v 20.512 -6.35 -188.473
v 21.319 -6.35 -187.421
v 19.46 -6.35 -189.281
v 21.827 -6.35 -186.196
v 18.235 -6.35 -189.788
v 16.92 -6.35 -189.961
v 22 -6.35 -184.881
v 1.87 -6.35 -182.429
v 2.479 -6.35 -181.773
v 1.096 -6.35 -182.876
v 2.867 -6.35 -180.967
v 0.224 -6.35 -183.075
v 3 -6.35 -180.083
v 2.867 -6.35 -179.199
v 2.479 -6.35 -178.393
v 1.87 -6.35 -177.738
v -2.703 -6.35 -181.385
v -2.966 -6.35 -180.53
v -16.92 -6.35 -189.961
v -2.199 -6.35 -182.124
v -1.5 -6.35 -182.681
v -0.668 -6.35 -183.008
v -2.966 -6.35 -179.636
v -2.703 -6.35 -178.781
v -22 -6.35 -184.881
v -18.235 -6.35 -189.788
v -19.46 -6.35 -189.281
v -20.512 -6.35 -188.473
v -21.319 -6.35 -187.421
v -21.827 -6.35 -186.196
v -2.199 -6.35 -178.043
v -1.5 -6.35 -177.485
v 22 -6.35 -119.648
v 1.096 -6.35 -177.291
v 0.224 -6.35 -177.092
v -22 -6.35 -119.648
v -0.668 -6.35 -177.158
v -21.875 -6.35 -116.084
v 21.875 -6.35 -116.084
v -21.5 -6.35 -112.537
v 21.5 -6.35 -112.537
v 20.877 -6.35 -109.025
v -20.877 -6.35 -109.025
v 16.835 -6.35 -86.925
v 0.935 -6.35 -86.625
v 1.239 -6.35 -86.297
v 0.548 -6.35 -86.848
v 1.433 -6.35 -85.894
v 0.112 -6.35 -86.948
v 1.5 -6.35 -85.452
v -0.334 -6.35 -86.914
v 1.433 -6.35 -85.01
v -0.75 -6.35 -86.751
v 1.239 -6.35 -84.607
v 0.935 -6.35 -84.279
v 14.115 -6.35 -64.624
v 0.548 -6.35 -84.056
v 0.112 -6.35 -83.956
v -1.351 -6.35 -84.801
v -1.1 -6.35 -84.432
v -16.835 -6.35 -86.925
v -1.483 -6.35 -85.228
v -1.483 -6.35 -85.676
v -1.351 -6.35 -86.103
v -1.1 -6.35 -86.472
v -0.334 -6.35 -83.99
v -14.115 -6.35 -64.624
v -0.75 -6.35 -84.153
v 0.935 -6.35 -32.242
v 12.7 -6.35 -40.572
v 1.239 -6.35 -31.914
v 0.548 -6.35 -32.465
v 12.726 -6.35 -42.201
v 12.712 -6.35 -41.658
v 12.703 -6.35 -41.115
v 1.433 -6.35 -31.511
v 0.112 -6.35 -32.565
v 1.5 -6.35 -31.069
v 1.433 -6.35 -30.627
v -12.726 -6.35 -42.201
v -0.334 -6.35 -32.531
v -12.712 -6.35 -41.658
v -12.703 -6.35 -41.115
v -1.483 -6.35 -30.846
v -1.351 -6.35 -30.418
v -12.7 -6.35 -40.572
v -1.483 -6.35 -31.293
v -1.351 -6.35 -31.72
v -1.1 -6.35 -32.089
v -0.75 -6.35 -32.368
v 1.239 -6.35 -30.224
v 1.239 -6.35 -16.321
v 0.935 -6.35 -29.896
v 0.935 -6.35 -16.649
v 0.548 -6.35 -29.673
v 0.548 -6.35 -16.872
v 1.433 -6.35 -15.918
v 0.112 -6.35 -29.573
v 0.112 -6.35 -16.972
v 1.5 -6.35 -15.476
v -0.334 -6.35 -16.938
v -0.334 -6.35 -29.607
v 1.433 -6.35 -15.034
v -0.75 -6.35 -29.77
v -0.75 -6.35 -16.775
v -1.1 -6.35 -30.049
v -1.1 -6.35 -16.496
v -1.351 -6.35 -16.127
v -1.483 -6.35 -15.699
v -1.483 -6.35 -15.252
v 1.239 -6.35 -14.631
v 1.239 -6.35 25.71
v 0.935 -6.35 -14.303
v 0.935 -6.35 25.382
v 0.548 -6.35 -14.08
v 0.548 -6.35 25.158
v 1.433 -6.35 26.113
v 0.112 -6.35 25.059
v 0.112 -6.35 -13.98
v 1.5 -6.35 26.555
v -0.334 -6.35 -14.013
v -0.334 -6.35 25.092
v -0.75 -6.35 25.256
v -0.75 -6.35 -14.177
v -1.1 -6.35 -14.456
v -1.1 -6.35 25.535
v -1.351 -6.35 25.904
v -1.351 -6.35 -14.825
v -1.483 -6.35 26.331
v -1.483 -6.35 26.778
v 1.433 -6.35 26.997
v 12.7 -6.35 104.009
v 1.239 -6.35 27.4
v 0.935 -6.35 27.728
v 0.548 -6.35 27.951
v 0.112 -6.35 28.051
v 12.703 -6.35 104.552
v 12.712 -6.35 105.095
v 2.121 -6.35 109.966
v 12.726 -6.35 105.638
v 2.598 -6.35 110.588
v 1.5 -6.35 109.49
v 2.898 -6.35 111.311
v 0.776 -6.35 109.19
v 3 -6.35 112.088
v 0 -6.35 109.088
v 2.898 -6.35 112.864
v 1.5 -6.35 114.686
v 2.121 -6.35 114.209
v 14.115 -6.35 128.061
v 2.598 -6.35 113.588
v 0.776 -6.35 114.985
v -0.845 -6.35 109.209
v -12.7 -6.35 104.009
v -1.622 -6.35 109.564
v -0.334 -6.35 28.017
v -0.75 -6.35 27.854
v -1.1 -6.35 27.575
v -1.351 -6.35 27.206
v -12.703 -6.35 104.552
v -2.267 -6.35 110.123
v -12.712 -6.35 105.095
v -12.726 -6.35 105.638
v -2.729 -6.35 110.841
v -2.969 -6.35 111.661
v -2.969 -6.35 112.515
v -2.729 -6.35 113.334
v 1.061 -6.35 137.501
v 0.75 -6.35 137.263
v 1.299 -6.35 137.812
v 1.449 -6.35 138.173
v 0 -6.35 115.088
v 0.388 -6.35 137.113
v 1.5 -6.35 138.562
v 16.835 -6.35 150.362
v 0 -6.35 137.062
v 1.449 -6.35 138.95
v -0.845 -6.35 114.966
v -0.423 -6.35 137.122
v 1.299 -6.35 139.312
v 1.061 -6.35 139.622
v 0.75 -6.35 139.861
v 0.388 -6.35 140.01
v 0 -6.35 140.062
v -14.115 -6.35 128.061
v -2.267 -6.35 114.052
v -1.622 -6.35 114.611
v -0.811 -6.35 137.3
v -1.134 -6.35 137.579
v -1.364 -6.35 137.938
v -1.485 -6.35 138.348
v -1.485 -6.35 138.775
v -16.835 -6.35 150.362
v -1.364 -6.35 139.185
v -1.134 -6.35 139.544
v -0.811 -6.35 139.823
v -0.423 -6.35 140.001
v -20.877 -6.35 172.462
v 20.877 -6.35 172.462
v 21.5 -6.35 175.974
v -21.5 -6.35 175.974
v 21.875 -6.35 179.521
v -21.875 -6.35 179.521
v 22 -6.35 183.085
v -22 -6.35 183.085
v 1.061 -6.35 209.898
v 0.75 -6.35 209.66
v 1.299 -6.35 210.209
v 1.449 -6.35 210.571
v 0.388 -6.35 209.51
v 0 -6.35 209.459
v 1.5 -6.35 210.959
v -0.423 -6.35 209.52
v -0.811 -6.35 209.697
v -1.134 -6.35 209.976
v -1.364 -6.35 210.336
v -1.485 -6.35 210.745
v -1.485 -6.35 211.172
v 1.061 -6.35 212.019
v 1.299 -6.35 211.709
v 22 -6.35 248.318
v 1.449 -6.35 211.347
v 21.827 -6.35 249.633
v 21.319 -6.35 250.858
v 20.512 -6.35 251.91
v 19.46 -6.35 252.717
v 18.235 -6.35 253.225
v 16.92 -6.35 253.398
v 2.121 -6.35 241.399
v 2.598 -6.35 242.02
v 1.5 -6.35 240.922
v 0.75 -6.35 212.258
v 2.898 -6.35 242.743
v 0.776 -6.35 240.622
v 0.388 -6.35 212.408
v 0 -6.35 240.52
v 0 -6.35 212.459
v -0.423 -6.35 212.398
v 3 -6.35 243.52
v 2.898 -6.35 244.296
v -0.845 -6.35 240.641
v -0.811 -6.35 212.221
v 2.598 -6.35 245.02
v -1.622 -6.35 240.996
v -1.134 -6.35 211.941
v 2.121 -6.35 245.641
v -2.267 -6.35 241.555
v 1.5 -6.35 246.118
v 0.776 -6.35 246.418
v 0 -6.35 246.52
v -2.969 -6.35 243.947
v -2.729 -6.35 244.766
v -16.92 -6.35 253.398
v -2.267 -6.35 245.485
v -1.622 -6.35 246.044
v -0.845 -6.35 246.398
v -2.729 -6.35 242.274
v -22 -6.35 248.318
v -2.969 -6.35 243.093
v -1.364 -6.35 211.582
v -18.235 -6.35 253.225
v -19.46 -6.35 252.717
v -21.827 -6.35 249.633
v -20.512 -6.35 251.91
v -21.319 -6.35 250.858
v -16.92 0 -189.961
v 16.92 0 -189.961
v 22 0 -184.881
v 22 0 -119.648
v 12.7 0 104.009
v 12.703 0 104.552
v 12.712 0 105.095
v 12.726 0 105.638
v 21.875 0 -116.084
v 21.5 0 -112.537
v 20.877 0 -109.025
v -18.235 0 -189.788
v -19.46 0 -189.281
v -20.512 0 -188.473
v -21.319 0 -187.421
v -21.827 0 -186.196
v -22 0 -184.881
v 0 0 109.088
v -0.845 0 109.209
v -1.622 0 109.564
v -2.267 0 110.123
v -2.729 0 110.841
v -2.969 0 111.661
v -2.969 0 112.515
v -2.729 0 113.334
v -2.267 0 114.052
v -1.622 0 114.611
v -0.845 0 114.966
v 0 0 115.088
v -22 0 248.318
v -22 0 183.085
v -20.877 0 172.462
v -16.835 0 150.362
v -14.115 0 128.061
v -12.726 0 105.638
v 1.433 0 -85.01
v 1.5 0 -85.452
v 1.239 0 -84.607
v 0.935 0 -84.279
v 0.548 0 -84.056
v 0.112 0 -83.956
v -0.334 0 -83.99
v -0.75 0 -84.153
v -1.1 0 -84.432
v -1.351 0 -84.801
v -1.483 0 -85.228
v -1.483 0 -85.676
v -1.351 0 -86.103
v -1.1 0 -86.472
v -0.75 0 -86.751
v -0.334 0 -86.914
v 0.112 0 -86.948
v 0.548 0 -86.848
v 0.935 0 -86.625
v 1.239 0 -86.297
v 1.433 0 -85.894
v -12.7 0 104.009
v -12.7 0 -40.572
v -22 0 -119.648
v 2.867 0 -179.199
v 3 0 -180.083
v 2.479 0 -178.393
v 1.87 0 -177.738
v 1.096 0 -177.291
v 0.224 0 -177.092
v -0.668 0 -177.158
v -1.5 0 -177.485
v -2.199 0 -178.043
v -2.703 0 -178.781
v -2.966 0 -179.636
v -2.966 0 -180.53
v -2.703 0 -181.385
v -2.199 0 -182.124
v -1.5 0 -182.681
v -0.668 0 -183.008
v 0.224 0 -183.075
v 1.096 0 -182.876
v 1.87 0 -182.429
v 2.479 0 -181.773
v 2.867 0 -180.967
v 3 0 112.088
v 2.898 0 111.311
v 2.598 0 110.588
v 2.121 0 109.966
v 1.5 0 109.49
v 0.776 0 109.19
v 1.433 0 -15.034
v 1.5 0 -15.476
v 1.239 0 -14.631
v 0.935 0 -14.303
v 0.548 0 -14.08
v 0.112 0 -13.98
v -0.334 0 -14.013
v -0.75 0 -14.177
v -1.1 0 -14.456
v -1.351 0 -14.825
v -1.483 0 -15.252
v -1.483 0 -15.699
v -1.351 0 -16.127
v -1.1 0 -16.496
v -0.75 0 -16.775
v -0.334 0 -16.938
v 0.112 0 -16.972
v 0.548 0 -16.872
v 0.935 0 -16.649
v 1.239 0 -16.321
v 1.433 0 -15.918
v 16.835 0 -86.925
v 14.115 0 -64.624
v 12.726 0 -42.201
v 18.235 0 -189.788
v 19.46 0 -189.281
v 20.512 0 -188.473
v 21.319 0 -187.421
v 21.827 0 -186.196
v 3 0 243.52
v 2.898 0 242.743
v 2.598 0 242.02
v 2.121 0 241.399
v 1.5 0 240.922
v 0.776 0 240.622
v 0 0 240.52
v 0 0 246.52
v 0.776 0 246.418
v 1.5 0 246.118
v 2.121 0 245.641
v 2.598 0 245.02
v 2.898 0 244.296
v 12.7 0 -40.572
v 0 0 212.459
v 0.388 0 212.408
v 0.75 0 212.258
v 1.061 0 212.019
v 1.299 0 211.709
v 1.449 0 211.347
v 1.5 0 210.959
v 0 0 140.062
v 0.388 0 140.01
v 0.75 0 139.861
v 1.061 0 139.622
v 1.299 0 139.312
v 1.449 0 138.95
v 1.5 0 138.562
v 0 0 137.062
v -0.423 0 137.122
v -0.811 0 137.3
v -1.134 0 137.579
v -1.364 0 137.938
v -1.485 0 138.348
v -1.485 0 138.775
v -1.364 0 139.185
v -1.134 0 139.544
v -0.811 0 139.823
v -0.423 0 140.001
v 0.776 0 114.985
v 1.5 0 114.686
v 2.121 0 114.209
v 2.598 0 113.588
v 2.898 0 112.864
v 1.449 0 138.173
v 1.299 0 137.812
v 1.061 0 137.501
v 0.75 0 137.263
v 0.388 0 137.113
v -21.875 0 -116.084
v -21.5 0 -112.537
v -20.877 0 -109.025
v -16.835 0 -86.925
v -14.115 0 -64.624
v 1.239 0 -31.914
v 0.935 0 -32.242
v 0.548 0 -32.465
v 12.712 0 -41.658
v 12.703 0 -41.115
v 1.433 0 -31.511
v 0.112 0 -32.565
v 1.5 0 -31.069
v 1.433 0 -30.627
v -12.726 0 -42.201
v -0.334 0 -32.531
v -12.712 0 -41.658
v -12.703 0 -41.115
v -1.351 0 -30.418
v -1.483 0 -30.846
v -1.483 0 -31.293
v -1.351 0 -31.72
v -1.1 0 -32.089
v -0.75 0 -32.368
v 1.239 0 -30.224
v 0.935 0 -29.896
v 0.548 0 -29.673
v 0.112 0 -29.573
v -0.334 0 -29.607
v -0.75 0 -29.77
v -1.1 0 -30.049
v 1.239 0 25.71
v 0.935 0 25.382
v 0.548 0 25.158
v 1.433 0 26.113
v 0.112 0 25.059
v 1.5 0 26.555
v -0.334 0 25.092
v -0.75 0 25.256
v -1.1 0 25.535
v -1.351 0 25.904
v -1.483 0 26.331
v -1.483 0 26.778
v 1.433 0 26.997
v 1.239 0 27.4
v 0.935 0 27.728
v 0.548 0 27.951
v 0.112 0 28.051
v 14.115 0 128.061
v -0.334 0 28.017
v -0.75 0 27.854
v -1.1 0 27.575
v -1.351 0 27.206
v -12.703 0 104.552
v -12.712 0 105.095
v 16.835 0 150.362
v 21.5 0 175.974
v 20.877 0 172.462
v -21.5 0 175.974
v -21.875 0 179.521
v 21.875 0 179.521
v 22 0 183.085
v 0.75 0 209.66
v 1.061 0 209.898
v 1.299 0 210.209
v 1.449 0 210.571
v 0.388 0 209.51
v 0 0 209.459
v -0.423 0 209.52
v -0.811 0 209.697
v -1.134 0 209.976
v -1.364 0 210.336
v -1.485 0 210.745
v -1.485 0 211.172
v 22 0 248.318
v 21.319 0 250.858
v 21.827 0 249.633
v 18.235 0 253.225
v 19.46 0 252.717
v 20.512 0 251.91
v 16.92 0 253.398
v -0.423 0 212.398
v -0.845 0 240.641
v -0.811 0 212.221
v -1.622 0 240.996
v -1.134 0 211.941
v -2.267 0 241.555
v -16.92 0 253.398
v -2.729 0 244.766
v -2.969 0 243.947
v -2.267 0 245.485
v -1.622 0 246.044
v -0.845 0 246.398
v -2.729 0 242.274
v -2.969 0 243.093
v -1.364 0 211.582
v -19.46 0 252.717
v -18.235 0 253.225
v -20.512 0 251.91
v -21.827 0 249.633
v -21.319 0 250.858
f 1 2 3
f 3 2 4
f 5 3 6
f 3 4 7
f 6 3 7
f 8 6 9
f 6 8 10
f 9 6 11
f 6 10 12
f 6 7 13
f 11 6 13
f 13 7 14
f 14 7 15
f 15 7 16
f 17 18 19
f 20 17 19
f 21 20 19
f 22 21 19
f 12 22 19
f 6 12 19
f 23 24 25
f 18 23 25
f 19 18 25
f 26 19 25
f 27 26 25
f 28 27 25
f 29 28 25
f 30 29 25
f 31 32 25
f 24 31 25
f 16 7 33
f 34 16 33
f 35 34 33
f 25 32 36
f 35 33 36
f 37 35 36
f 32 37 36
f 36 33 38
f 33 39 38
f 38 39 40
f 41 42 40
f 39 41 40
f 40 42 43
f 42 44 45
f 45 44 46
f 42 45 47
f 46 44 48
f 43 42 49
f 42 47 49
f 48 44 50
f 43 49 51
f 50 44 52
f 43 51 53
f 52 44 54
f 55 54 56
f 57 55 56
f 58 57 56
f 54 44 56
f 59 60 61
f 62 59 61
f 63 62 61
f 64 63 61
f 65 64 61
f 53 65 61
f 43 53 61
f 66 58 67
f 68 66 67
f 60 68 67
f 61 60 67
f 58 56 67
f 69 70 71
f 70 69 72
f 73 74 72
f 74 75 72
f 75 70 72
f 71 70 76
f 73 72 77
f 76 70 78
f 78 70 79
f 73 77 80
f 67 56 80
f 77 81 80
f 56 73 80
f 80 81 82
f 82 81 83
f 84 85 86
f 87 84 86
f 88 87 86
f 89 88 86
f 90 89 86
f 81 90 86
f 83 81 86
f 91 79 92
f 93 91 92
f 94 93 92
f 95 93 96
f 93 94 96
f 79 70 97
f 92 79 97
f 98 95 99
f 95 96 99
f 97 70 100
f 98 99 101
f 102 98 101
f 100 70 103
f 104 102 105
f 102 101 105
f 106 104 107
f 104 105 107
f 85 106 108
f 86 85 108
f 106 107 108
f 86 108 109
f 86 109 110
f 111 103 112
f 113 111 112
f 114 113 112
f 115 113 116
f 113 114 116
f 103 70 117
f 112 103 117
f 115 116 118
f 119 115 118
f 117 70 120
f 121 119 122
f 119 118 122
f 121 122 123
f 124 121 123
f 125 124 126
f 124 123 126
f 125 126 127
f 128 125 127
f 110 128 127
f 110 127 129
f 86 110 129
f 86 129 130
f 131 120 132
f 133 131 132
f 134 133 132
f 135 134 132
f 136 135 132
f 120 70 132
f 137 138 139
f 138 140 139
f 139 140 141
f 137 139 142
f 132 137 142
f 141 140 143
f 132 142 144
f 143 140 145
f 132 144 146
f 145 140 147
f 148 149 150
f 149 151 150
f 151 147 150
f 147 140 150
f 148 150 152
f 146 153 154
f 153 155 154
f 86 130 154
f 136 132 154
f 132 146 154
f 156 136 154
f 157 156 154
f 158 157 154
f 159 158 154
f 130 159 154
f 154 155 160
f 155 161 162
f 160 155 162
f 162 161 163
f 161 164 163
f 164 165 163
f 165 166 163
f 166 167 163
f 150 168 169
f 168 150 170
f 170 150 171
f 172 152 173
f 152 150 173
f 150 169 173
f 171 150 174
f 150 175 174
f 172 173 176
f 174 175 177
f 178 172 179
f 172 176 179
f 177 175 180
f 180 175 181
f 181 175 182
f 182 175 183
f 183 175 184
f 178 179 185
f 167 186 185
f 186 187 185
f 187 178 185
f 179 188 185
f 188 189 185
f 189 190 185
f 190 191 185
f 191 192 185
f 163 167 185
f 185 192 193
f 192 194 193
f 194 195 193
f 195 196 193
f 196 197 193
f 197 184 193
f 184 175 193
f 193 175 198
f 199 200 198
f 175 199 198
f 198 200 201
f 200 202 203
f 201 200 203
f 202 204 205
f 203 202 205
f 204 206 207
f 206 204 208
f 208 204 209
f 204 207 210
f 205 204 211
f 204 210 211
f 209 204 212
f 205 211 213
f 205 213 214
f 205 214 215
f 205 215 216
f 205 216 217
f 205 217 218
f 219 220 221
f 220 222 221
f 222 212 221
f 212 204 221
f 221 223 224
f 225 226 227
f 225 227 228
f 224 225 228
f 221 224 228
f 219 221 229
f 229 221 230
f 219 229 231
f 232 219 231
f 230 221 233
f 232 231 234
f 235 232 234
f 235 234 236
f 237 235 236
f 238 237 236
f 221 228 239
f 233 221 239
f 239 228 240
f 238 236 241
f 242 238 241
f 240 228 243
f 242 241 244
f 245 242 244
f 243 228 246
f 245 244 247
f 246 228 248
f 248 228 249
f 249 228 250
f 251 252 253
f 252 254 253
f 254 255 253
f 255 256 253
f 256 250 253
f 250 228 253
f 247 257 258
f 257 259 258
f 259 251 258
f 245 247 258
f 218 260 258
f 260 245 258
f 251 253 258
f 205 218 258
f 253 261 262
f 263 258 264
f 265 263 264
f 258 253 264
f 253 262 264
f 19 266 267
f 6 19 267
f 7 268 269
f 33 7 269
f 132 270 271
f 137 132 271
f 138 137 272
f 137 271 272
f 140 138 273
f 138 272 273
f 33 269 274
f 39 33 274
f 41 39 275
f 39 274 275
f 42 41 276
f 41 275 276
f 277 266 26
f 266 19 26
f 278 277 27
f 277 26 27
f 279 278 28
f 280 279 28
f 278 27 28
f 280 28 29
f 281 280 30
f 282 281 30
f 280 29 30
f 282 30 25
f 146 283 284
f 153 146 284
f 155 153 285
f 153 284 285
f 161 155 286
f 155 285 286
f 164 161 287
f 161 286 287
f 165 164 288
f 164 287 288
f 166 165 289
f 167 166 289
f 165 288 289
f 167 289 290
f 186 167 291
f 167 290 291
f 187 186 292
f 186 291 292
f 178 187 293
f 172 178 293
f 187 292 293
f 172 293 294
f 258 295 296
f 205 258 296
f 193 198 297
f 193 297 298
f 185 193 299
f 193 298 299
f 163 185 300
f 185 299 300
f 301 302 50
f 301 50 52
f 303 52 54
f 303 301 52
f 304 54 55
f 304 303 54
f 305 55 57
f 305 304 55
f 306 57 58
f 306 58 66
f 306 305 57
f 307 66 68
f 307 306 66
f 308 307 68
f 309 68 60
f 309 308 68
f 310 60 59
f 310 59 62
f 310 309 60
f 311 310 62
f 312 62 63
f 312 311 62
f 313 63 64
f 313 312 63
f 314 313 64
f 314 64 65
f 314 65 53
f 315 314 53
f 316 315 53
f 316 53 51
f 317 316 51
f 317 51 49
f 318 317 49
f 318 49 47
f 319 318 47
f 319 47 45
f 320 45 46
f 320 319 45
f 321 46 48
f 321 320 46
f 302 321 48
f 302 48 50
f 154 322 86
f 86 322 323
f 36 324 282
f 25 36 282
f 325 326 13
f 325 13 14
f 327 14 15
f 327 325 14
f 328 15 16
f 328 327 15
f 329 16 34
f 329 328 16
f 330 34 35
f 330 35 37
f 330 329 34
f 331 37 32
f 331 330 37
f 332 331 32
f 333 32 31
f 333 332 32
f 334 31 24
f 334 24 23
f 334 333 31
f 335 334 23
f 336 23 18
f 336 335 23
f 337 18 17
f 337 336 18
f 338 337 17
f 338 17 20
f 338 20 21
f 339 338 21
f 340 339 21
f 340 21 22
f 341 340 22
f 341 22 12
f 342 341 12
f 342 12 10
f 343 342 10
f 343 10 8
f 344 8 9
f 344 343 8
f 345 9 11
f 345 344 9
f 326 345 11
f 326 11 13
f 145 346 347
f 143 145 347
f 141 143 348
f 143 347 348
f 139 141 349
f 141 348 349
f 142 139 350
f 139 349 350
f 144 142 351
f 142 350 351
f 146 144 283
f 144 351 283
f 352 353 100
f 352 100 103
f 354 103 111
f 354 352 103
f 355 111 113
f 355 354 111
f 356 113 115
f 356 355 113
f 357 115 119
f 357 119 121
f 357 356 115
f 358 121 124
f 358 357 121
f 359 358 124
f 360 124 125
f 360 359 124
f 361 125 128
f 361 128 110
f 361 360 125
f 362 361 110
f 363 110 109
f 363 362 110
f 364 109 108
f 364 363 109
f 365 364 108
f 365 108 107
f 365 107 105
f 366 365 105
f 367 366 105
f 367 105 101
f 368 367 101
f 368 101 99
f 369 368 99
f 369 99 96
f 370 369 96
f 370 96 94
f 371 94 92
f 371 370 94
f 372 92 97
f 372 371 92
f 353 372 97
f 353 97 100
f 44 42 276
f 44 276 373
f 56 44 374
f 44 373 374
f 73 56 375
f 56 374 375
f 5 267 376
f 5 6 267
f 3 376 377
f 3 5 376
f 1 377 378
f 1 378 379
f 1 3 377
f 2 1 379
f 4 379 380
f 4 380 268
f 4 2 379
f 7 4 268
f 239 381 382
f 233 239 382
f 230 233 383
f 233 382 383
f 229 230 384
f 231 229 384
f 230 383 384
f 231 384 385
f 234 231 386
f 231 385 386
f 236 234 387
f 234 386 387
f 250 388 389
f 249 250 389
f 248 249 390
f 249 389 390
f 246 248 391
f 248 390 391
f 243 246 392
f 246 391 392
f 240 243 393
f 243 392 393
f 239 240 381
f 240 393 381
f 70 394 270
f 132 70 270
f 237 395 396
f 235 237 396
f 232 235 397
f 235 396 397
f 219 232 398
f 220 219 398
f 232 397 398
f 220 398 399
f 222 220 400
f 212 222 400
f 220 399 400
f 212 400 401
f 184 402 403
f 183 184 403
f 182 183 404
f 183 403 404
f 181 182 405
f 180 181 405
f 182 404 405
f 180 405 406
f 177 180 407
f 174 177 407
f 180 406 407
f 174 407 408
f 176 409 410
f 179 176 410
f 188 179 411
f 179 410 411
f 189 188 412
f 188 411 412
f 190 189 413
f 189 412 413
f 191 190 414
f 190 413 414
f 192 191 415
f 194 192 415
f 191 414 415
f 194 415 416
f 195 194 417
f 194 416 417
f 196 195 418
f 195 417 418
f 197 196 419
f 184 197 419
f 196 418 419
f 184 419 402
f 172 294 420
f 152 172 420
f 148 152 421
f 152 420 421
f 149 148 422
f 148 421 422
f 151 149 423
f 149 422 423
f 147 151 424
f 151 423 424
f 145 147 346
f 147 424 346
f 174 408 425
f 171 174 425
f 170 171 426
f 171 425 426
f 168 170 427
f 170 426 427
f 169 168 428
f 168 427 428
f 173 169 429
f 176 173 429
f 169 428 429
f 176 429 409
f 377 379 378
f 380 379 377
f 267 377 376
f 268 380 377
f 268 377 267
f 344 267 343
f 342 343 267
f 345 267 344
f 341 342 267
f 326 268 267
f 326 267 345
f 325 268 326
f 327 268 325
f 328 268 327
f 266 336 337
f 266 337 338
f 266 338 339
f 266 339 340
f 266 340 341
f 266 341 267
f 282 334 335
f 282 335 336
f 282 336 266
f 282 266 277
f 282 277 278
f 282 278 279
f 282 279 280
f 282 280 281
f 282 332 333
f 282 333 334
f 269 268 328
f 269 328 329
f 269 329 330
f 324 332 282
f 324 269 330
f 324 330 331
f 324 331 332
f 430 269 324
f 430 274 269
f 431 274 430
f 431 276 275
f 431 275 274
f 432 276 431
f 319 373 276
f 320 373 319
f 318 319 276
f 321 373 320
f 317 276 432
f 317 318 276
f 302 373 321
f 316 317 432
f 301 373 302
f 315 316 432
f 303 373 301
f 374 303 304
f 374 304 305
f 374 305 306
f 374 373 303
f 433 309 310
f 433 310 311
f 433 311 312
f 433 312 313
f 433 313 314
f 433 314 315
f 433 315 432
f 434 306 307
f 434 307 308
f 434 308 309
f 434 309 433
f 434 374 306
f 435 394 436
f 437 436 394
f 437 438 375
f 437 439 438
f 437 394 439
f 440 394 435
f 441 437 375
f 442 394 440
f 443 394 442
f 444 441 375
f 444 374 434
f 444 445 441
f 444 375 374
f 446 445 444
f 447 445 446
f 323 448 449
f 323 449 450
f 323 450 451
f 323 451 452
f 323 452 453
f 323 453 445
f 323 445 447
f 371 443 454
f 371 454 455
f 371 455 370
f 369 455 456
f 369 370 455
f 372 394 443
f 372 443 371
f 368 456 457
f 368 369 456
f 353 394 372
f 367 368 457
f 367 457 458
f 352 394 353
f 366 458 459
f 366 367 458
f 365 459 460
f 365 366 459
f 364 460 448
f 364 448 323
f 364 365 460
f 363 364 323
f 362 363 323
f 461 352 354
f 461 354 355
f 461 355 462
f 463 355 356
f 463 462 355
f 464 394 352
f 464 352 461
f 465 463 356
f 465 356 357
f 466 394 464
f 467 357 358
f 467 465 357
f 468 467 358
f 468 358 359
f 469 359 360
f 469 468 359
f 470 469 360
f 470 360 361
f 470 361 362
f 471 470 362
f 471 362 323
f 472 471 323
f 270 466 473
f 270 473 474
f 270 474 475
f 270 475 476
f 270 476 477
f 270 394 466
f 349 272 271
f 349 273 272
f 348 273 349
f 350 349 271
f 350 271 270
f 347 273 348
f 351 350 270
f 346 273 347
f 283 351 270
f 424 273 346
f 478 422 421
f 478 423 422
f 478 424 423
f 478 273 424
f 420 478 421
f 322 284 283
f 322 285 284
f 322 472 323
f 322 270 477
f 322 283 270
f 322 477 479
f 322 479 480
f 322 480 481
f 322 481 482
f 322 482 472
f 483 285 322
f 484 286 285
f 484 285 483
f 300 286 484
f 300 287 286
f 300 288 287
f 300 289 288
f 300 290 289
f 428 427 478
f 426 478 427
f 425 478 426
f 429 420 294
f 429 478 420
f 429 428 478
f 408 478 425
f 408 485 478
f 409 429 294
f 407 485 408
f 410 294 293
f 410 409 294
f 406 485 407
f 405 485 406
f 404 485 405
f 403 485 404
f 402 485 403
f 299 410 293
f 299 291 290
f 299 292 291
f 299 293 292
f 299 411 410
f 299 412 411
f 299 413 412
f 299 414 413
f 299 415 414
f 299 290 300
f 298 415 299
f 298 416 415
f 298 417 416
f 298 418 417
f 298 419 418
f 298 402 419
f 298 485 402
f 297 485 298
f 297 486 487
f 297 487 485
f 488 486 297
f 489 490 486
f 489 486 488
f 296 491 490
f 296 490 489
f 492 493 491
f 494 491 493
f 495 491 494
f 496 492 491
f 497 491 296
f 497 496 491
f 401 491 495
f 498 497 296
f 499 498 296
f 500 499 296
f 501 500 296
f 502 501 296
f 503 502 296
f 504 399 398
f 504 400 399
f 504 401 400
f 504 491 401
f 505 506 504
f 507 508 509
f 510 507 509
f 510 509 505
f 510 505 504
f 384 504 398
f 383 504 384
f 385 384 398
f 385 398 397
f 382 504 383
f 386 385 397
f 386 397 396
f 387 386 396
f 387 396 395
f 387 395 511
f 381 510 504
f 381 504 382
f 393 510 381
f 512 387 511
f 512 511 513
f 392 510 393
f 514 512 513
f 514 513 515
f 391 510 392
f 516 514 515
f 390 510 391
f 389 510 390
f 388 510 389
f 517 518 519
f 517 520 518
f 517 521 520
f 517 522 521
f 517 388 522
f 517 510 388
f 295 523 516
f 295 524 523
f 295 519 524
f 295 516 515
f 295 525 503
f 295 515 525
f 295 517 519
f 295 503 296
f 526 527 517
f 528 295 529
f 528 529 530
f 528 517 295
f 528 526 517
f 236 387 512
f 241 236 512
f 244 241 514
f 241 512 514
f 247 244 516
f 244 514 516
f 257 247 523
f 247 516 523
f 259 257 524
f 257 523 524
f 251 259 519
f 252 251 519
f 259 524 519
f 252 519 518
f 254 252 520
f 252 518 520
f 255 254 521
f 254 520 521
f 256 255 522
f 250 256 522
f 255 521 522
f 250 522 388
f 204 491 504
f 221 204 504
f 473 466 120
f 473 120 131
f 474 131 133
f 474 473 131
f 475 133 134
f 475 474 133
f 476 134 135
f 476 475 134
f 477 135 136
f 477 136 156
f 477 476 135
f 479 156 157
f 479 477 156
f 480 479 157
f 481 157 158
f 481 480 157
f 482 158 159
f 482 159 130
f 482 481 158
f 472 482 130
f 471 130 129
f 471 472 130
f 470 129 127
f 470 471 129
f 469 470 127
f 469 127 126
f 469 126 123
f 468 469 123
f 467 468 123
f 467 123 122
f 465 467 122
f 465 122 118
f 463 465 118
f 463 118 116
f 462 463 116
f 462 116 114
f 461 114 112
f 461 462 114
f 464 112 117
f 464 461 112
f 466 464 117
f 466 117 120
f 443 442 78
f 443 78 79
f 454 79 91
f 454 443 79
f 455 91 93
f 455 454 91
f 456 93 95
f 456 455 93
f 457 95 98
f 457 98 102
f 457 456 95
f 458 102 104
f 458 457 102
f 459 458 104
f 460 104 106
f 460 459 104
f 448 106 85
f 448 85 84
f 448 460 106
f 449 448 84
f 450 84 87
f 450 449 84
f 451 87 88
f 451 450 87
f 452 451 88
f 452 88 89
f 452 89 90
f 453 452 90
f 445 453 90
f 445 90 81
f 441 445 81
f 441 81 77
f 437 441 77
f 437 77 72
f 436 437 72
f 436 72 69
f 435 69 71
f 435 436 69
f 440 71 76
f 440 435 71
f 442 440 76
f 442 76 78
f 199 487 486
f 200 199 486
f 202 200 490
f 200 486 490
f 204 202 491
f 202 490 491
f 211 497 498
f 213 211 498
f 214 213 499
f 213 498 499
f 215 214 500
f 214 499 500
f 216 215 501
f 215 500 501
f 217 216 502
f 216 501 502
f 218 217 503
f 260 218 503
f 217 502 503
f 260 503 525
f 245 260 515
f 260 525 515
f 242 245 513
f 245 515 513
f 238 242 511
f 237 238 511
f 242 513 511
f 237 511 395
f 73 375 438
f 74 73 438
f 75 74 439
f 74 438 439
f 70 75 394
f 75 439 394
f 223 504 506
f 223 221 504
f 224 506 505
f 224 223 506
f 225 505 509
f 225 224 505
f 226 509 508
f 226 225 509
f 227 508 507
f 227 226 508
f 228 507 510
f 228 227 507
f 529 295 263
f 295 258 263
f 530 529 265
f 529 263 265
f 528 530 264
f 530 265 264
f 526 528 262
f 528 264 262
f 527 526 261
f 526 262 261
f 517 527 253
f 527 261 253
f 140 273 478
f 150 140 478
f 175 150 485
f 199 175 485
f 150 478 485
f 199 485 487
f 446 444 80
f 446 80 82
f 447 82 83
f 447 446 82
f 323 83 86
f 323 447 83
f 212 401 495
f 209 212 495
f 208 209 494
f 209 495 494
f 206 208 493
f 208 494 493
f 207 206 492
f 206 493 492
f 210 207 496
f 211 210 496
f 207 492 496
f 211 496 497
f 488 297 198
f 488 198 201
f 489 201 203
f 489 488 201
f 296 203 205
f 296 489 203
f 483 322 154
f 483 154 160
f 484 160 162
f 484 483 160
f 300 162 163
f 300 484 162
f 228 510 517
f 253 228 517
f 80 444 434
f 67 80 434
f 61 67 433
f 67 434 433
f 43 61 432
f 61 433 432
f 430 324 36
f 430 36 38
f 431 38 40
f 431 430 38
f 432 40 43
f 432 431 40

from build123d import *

# Parameters (mm, degrees)
F0_R        = 3
F0_R_2      = 1.5
F1_DEPTH    = 6.35
F2_R        = 5.08
F3_T1_DEPTH = 6.35
F3_T3_DEPTH = 34.0624500619


# Not quite as in the source:
# - a fillet or chamfer that OpenCascade refuses, or shapes differently, is made with other operations: its cross-section is extruded or revolved along the edge and cut away or added
# - a feature names something its author has since deleted; it is built from what else it names


with BuildPart() as f1:
    # F0 (on Front) → F1 (new body)
    with BuildSketch(Plane.XZ):
        with BuildLine():
            Line((-22, -189.9611499309), (-4.6853246795, -189.9611499309))
            Line((-4.6853246795, -189.9611499309), (4.6853246795, -189.9611499309))
            Line((4.6853246795, -189.9611499309), (22, -189.9611499309))
            Line((22, -189.9611499309), (22, -172.8709284505))
            Line((22, -172.8709284505), (22, -114.1058849427))
            ThreePointArc((22, -114.1058849427), (15.5787747464, -77.9579307824), (12.7, -41.3571195934))
            Line((12.7, -41.3571195934), (12.7, 104.7939062119))
            ThreePointArc((12.7, 104.7939062119), (15.5787747464, 141.3947174009), (22, 177.5426715612))
            Line((22, 177.5426715612), (22, 225.4278063774))
            Line((22, 225.4278063774), (22, 236.307715069))
            Line((22, 236.307715069), (22, 253.3979365494))
            Line((22, 253.3979365494), (4.6853246795, 253.3979365494))
            Line((4.6853246795, 253.3979365494), (0, 253.3979365494))
            Line((0, 253.3979365494), (-4.6853246795, 253.3979365494))
            Line((-4.6853246795, 253.3979365494), (-22, 253.3979365494))
            Line((-22, 253.3979365494), (-22, 236.307715069))
            Line((-22, 236.307715069), (-22, 225.4278063774))
            Line((-22, 225.4278063774), (-22, 177.5426715612))
            ThreePointArc((-22, 177.5426715612), (-15.5787747464, 141.3947174009), (-12.7, 104.7939062119))
            Line((-12.7, 104.7939062119), (-12.7, -41.3571195934))
            ThreePointArc((-12.7, -41.3571195934), (-15.5787747464, -77.9579307824), (-22, -114.1058849427))
            Line((-22, -114.1058849427), (-22, -161.9910197589))
            Line((-22, -161.9910197589), (-22, -189.9611499309))
        make_face()
        with Locations((0, -180.0831407309)):
            Circle(F0_R, mode=Mode.SUBTRACT)
        with Locations((0, -85.4520261312)):
            Circle(F0_R_2, mode=Mode.SUBTRACT)
        with Locations((0, -31.0690756887)):
            Circle(F0_R_2, mode=Mode.SUBTRACT)
        with Locations((0, -15.4758756887)):
            Circle(F0_R_2, mode=Mode.SUBTRACT)
        with Locations((0, 26.5547856688)):
            Circle(F0_R_2, mode=Mode.SUBTRACT)
        with BuildLine():
            ThreePointArc((0, 109.0876222849), (-3, 112.0876222849), (0, 115.0876222849))
            ThreePointArc((0, 115.0876222849), (2.1213203436, 114.2089426284), (3, 112.0876222849))
            ThreePointArc((3, 112.0876222849), (2.1213203436, 109.9663019413), (0, 109.0876222849))
        make_face(mode=Mode.SUBTRACT)
        with BuildLine():
            ThreePointArc((0, 137.0615974688), (-1.5, 138.5615974688), (0, 140.0615974688))
            ThreePointArc((0, 140.0615974688), (1.0606601718, 139.6222576406), (1.5, 138.5615974688))
            ThreePointArc((1.5, 138.5615974688), (1.0606601718, 137.5009372971), (0, 137.0615974688))
        make_face(mode=Mode.SUBTRACT)
        with BuildLine():
            ThreePointArc((0, 209.4587856688), (-1.5, 210.9587856688), (0, 212.4587856688))
            ThreePointArc((0, 212.4587856688), (1.0606601718, 212.0194458406), (1.5, 210.9587856688))
            ThreePointArc((1.5, 210.9587856688), (1.0606601718, 209.8981254971), (0, 209.4587856688))
        make_face(mode=Mode.SUBTRACT)
        with BuildLine():
            ThreePointArc((0, 240.5199192026), (-3, 243.5199192026), (0, 246.5199192026))
            ThreePointArc((0, 246.5199192026), (2.1213203436, 245.6412395461), (3, 243.5199192026))
            ThreePointArc((3, 243.5199192026), (2.1213203436, 241.398598859), (0, 240.5199192026))
        make_face(mode=Mode.SUBTRACT)
    extrude(amount=F1_DEPTH)

    # F2
    f2_edges = [f1.edges().sort_by_distance(p)[0] for p in [
        (-22, -3.175, 253.397937),
        (22, -3.175, 253.397937),
        (22, -3.175, -189.96115),
        (-22, -3.175, -189.96115),
    ]]
    fillet(f2_edges, radius=F2_R)

    # F3: fillet of radius 50.8 on 8 edges, made by hand

    # F3_s2 → F3_t1 (join)
    with BuildSketch(Plane.XZ):
        with BuildLine():
            ThreePointArc((-12.7, 104.0086355302), (-12.7065317021, 104.8232386677), (-12.7261251288, 105.6376323271))
            ThreePointArc((-12.7261251288, 105.6376323271), (-12.7128266876, 105.2157765732), (-12.7, 104.7939062119))
            Line((-12.7, 104.7939062119), (-12.7, 104.0086355302))
        make_face()
        with BuildLine():
            ThreePointArc((12.7, 104.0086355302), (12.7065317021, 104.8232386677), (12.7261251288, 105.6376323271))
            ThreePointArc((12.7261251288, 105.6376323271), (12.7128266876, 105.2157765732), (12.7, 104.7939062119))
            Line((12.7, 104.7939062119), (12.7, 104.0086355302))
        make_face()
        with BuildLine():
            ThreePointArc((12.7261251288, -42.2008457086), (12.7065317021, -41.3864520492), (12.7, -40.5718489117))
            Line((12.7, -40.5718489117), (12.7, -41.3571195934))
            ThreePointArc((12.7, -41.3571195934), (12.7128266876, -41.7789899547), (12.7261251288, -42.2008457086))
        make_face()
        with BuildLine():
            ThreePointArc((-12.7261251288, -42.2008457086), (-12.7065317021, -41.3864520492), (-12.7, -40.5718489116))
            Line((-12.7, -40.5718489116), (-12.7, -41.3571195934))
            ThreePointArc((-12.7, -41.3571195934), (-12.7128266876, -41.7789899547), (-12.7261251288, -42.2008457086))
        make_face()
    extrude(amount=F3_T1_DEPTH)

    # F3_s4 → F3_t3 (cut)
    with BuildSketch(Plane.XZ.offset(-13.856225031)):
        with BuildLine():
            ThreePointArc((-22, -119.6483749551), (-21.7184280188, -114.3071737314), (-20.8768334444, -109.025182453))
            ThreePointArc((-20.8768334444, -109.025182453), (-21.429661091, -111.5674692633), (-22, -114.1058849427))
            Line((-22, -114.1058849427), (-22, -119.6483749551))
        make_face()
        with BuildLine():
            ThreePointArc((22, -119.6483749551), (21.7184280188, -114.3071737314), (20.8768334444, -109.025182453))
            ThreePointArc((20.8768334444, -109.025182453), (21.429661091, -111.5674692633), (22, -114.1058849427))
            Line((22, -114.1058849427), (22, -119.6483749551))
        make_face()
        with BuildLine():
            ThreePointArc((20.8768334444, 172.4619690715), (21.7184280188, 177.7439603499), (22, 183.0851615736))
            Line((22, 183.0851615736), (22, 177.5426715612))
            ThreePointArc((22, 177.5426715612), (21.429661091, 175.0042558818), (20.8768334444, 172.4619690715))
        make_face()
        with BuildLine():
            ThreePointArc((-20.8768334444, 172.4619690715), (-21.7184280188, 177.7439603499), (-22, 183.0851615736))
            Line((-22, 183.0851615736), (-22, 177.5426715612))
            ThreePointArc((-22, 177.5426715612), (-21.429661091, 175.0042558818), (-20.8768334444, 172.4619690715))
        make_face()
    extrude(amount=F3_T3_DEPTH, mode=Mode.SUBTRACT)


solid = f1.part
